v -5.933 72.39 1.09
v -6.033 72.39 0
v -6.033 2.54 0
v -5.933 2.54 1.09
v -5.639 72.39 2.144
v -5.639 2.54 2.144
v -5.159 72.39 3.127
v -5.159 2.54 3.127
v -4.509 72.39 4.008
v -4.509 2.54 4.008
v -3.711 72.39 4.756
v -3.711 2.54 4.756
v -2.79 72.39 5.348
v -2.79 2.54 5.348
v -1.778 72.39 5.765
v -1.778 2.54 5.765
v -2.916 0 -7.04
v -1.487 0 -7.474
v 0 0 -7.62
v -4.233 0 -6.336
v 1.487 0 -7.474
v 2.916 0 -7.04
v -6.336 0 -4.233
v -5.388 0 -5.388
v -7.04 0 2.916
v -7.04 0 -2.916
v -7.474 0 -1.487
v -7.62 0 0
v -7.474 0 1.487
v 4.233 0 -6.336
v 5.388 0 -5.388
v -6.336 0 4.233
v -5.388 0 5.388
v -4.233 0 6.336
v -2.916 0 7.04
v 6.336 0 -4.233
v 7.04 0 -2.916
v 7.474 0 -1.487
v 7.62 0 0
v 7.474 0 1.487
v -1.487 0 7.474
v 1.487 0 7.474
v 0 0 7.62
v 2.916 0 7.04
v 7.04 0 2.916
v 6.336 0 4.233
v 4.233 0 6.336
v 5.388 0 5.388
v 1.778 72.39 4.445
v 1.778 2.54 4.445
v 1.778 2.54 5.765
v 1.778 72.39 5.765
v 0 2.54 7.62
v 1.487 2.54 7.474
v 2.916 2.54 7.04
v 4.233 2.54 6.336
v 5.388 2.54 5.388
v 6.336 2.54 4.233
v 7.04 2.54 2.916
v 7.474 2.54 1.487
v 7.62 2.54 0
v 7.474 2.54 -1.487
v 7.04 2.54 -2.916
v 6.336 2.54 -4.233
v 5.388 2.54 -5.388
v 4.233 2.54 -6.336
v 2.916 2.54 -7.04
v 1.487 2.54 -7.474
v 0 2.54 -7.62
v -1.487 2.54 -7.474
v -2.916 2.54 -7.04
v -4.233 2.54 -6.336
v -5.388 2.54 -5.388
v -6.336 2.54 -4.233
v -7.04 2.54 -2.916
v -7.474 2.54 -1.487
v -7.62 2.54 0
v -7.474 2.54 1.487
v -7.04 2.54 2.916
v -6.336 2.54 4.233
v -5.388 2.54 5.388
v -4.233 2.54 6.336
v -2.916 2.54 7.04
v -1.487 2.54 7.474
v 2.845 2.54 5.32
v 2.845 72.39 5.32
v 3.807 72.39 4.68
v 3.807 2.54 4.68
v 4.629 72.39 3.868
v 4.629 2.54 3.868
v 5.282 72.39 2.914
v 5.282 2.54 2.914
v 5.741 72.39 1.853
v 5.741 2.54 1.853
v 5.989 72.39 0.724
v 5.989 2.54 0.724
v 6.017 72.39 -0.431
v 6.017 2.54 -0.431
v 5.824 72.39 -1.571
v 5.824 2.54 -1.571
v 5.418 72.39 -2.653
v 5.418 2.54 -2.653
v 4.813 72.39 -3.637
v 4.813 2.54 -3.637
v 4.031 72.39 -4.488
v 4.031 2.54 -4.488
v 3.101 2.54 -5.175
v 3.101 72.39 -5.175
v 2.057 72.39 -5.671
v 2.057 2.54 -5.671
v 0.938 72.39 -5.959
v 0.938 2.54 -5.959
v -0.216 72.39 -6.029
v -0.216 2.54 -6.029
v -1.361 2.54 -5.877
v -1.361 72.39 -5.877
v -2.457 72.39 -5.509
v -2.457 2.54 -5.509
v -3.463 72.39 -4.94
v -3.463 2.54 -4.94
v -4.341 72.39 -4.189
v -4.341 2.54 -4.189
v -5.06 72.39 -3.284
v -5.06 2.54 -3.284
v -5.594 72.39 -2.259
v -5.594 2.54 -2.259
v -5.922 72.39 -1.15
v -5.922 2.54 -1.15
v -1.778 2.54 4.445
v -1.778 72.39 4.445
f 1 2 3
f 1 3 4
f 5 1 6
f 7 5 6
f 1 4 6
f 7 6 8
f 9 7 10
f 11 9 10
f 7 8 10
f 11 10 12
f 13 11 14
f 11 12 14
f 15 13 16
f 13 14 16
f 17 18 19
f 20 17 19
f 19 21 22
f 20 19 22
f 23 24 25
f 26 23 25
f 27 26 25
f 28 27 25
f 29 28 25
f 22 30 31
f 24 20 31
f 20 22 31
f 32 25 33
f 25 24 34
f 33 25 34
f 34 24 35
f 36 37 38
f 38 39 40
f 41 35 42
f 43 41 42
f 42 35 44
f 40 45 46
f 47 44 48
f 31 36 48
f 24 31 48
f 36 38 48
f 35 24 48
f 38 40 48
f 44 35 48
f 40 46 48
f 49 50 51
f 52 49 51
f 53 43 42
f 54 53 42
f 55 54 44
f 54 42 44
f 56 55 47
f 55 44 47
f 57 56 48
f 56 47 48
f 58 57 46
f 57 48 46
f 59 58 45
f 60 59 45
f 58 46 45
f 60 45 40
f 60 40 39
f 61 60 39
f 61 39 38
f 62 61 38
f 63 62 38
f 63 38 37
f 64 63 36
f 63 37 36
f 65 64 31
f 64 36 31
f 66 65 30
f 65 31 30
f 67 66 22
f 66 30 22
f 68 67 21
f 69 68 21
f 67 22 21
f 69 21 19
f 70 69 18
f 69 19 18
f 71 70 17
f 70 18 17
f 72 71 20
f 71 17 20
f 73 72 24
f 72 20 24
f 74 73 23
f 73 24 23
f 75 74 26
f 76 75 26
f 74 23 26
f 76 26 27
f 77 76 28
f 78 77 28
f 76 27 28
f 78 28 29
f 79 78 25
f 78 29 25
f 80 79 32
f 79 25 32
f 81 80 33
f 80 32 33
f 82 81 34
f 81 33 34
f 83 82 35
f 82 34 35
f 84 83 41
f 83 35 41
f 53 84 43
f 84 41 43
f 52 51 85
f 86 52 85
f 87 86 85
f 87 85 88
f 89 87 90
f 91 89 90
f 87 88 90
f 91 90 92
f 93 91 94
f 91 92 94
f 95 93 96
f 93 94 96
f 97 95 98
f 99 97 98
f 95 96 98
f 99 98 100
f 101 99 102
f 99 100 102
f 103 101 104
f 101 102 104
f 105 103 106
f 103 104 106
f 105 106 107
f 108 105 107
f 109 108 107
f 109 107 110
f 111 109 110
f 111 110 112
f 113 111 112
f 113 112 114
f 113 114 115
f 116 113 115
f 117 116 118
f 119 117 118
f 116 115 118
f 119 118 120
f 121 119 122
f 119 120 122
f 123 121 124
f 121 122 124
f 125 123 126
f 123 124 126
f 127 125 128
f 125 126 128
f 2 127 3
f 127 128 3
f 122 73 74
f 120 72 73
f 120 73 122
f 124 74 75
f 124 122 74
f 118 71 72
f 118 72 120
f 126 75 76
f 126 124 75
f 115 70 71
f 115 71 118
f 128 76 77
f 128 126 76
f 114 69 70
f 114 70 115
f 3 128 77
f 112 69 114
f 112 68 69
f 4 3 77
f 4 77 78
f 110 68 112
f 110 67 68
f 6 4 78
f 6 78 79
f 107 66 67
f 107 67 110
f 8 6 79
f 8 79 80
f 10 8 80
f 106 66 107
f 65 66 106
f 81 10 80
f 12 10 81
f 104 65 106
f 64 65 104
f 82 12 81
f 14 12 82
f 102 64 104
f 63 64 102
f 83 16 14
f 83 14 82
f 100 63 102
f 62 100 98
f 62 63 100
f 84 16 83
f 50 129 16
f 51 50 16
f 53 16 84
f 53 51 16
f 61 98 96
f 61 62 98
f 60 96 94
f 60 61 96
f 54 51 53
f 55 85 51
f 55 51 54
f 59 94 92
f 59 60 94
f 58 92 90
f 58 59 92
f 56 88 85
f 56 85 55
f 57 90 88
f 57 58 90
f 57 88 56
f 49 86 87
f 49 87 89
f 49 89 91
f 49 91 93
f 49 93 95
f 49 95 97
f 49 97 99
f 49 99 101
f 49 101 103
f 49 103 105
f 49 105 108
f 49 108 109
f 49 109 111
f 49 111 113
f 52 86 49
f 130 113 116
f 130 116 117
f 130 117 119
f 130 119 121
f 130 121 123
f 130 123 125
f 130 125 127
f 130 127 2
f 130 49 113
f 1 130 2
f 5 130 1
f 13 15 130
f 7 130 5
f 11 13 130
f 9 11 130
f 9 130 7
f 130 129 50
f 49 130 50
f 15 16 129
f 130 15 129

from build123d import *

# Parameters (mm, degrees)
SKETCH1_R           = 7.62
BOSS_EXTRUDE1_DEPTH = 2.54
BOSS_EXTRUDE2_DEPTH = 69.85


with BuildPart() as part:
    # Sketch1 → Boss-Extrude1 (new body)
    with BuildSketch(Plane(origin=(0, 0, 0), x_dir=(1, 0, 0), z_dir=(0, 1, 0))):
        with Locations(Location((0, 0, 0), (0, 0, 270))):
            Circle(SKETCH1_R)
    extrude(amount=BOSS_EXTRUDE1_DEPTH)

    # Sketch2 → Boss-Extrude2 (add)
    with BuildSketch(Plane(origin=(0, 2.54, 0), x_dir=(-1, 0, 0), z_dir=(0, 1, 0))):
        with BuildLine():
            Line((1.778, 4.445), (-1.778, 4.445))
            Line((-1.778, 4.445), (-1.778, 5.764527062))
            ThreePointArc((-1.778, 5.764527062), (-3.582266828, -4.853701745), (6.0325, 0))
            ThreePointArc((6.0325, 0), (4.853701745, 3.582266828), (1.778, 5.764527062))
            Line((1.778, 5.764527062), (1.778, 4.445))
        make_face()
    extrude(amount=BOSS_EXTRUDE2_DEPTH)


solid = part.part
